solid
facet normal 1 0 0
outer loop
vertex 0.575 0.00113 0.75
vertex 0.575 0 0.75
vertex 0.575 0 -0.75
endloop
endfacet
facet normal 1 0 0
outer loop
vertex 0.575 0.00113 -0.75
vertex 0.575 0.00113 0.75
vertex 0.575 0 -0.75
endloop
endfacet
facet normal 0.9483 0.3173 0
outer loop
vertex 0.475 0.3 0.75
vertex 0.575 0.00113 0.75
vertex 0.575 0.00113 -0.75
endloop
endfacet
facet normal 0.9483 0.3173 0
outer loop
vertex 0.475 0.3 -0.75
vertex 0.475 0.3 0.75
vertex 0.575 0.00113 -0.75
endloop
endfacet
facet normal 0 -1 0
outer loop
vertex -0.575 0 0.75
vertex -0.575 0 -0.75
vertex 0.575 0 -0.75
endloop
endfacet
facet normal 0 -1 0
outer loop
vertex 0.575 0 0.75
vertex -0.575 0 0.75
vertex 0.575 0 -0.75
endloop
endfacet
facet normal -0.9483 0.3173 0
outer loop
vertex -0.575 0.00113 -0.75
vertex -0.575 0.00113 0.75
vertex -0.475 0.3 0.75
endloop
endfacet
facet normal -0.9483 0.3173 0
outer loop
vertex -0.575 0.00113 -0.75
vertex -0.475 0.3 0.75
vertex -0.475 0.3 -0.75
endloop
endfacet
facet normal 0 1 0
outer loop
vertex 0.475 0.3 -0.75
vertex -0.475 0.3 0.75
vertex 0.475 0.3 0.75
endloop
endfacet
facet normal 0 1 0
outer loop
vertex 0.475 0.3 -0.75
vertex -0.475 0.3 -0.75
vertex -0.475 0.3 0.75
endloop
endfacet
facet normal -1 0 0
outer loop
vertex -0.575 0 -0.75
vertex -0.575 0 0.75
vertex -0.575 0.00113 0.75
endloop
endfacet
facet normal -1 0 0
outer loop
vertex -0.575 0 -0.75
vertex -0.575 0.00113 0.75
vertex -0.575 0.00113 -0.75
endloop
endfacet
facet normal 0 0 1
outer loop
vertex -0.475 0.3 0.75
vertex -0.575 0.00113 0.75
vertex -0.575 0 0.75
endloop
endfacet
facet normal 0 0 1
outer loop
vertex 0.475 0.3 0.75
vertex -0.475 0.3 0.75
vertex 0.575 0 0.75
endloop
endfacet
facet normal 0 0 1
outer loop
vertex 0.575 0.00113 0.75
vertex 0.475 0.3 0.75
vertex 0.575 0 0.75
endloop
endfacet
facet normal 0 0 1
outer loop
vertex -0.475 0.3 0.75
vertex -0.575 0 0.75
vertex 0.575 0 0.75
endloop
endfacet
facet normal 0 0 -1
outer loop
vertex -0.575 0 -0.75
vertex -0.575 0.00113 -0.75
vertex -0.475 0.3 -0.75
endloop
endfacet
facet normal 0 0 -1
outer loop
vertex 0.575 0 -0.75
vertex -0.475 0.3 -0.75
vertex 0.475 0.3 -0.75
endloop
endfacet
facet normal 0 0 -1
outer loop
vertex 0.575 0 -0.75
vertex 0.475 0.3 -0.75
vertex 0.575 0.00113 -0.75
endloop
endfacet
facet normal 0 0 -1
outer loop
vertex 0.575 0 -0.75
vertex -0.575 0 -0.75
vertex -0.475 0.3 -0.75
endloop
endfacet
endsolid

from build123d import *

# Parameters (mm, degrees)
SKETCH_1_W      = 1.15
SKETCH_1_H      = 1.5
EXTRUDE_1_DEPTH = 0.3
CHAMFER_1_SIZE  = 0.1
CHAMFER_1_SIZE2 = 0.298868496
CHAMFER_2_SIZE  = 0.1
CHAMFER_2_SIZE2 = 0.298868496


with BuildPart() as part:
    # 草图1 → 凸台-拉伸1 (new body)
    with BuildSketch(Plane(origin=(0, 0, 0), x_dir=(1, 0, 0), z_dir=(0, 1, 0))):
        Rectangle(SKETCH_1_W, SKETCH_1_H)
    extrude(amount=EXTRUDE_1_DEPTH)

    # 倒角1
    chamfer_1_edges = [part.edges().sort_by_distance(p)[0] for p in [
        (-0.575, 0.3, 0),
    ]]
    chamfer_1_side = [part.faces().sort_by_distance(p)[0] for p in [
        (0, 0.3, 0),
    ]]
    chamfer(chamfer_1_edges, length=CHAMFER_1_SIZE, length2=CHAMFER_1_SIZE2, reference=chamfer_1_side[0])

    # 倒角2
    chamfer_2_edges = [part.edges().sort_by_distance(p)[0] for p in [
        (0.575, 0.3, 0),
    ]]
    chamfer_2_side = [part.faces().sort_by_distance(p)[0] for p in [
        (0.05, 0.3, 0),
    ]]
    chamfer(chamfer_2_edges, length=CHAMFER_2_SIZE, length2=CHAMFER_2_SIZE2, reference=chamfer_2_side[0])


solid = part.part
